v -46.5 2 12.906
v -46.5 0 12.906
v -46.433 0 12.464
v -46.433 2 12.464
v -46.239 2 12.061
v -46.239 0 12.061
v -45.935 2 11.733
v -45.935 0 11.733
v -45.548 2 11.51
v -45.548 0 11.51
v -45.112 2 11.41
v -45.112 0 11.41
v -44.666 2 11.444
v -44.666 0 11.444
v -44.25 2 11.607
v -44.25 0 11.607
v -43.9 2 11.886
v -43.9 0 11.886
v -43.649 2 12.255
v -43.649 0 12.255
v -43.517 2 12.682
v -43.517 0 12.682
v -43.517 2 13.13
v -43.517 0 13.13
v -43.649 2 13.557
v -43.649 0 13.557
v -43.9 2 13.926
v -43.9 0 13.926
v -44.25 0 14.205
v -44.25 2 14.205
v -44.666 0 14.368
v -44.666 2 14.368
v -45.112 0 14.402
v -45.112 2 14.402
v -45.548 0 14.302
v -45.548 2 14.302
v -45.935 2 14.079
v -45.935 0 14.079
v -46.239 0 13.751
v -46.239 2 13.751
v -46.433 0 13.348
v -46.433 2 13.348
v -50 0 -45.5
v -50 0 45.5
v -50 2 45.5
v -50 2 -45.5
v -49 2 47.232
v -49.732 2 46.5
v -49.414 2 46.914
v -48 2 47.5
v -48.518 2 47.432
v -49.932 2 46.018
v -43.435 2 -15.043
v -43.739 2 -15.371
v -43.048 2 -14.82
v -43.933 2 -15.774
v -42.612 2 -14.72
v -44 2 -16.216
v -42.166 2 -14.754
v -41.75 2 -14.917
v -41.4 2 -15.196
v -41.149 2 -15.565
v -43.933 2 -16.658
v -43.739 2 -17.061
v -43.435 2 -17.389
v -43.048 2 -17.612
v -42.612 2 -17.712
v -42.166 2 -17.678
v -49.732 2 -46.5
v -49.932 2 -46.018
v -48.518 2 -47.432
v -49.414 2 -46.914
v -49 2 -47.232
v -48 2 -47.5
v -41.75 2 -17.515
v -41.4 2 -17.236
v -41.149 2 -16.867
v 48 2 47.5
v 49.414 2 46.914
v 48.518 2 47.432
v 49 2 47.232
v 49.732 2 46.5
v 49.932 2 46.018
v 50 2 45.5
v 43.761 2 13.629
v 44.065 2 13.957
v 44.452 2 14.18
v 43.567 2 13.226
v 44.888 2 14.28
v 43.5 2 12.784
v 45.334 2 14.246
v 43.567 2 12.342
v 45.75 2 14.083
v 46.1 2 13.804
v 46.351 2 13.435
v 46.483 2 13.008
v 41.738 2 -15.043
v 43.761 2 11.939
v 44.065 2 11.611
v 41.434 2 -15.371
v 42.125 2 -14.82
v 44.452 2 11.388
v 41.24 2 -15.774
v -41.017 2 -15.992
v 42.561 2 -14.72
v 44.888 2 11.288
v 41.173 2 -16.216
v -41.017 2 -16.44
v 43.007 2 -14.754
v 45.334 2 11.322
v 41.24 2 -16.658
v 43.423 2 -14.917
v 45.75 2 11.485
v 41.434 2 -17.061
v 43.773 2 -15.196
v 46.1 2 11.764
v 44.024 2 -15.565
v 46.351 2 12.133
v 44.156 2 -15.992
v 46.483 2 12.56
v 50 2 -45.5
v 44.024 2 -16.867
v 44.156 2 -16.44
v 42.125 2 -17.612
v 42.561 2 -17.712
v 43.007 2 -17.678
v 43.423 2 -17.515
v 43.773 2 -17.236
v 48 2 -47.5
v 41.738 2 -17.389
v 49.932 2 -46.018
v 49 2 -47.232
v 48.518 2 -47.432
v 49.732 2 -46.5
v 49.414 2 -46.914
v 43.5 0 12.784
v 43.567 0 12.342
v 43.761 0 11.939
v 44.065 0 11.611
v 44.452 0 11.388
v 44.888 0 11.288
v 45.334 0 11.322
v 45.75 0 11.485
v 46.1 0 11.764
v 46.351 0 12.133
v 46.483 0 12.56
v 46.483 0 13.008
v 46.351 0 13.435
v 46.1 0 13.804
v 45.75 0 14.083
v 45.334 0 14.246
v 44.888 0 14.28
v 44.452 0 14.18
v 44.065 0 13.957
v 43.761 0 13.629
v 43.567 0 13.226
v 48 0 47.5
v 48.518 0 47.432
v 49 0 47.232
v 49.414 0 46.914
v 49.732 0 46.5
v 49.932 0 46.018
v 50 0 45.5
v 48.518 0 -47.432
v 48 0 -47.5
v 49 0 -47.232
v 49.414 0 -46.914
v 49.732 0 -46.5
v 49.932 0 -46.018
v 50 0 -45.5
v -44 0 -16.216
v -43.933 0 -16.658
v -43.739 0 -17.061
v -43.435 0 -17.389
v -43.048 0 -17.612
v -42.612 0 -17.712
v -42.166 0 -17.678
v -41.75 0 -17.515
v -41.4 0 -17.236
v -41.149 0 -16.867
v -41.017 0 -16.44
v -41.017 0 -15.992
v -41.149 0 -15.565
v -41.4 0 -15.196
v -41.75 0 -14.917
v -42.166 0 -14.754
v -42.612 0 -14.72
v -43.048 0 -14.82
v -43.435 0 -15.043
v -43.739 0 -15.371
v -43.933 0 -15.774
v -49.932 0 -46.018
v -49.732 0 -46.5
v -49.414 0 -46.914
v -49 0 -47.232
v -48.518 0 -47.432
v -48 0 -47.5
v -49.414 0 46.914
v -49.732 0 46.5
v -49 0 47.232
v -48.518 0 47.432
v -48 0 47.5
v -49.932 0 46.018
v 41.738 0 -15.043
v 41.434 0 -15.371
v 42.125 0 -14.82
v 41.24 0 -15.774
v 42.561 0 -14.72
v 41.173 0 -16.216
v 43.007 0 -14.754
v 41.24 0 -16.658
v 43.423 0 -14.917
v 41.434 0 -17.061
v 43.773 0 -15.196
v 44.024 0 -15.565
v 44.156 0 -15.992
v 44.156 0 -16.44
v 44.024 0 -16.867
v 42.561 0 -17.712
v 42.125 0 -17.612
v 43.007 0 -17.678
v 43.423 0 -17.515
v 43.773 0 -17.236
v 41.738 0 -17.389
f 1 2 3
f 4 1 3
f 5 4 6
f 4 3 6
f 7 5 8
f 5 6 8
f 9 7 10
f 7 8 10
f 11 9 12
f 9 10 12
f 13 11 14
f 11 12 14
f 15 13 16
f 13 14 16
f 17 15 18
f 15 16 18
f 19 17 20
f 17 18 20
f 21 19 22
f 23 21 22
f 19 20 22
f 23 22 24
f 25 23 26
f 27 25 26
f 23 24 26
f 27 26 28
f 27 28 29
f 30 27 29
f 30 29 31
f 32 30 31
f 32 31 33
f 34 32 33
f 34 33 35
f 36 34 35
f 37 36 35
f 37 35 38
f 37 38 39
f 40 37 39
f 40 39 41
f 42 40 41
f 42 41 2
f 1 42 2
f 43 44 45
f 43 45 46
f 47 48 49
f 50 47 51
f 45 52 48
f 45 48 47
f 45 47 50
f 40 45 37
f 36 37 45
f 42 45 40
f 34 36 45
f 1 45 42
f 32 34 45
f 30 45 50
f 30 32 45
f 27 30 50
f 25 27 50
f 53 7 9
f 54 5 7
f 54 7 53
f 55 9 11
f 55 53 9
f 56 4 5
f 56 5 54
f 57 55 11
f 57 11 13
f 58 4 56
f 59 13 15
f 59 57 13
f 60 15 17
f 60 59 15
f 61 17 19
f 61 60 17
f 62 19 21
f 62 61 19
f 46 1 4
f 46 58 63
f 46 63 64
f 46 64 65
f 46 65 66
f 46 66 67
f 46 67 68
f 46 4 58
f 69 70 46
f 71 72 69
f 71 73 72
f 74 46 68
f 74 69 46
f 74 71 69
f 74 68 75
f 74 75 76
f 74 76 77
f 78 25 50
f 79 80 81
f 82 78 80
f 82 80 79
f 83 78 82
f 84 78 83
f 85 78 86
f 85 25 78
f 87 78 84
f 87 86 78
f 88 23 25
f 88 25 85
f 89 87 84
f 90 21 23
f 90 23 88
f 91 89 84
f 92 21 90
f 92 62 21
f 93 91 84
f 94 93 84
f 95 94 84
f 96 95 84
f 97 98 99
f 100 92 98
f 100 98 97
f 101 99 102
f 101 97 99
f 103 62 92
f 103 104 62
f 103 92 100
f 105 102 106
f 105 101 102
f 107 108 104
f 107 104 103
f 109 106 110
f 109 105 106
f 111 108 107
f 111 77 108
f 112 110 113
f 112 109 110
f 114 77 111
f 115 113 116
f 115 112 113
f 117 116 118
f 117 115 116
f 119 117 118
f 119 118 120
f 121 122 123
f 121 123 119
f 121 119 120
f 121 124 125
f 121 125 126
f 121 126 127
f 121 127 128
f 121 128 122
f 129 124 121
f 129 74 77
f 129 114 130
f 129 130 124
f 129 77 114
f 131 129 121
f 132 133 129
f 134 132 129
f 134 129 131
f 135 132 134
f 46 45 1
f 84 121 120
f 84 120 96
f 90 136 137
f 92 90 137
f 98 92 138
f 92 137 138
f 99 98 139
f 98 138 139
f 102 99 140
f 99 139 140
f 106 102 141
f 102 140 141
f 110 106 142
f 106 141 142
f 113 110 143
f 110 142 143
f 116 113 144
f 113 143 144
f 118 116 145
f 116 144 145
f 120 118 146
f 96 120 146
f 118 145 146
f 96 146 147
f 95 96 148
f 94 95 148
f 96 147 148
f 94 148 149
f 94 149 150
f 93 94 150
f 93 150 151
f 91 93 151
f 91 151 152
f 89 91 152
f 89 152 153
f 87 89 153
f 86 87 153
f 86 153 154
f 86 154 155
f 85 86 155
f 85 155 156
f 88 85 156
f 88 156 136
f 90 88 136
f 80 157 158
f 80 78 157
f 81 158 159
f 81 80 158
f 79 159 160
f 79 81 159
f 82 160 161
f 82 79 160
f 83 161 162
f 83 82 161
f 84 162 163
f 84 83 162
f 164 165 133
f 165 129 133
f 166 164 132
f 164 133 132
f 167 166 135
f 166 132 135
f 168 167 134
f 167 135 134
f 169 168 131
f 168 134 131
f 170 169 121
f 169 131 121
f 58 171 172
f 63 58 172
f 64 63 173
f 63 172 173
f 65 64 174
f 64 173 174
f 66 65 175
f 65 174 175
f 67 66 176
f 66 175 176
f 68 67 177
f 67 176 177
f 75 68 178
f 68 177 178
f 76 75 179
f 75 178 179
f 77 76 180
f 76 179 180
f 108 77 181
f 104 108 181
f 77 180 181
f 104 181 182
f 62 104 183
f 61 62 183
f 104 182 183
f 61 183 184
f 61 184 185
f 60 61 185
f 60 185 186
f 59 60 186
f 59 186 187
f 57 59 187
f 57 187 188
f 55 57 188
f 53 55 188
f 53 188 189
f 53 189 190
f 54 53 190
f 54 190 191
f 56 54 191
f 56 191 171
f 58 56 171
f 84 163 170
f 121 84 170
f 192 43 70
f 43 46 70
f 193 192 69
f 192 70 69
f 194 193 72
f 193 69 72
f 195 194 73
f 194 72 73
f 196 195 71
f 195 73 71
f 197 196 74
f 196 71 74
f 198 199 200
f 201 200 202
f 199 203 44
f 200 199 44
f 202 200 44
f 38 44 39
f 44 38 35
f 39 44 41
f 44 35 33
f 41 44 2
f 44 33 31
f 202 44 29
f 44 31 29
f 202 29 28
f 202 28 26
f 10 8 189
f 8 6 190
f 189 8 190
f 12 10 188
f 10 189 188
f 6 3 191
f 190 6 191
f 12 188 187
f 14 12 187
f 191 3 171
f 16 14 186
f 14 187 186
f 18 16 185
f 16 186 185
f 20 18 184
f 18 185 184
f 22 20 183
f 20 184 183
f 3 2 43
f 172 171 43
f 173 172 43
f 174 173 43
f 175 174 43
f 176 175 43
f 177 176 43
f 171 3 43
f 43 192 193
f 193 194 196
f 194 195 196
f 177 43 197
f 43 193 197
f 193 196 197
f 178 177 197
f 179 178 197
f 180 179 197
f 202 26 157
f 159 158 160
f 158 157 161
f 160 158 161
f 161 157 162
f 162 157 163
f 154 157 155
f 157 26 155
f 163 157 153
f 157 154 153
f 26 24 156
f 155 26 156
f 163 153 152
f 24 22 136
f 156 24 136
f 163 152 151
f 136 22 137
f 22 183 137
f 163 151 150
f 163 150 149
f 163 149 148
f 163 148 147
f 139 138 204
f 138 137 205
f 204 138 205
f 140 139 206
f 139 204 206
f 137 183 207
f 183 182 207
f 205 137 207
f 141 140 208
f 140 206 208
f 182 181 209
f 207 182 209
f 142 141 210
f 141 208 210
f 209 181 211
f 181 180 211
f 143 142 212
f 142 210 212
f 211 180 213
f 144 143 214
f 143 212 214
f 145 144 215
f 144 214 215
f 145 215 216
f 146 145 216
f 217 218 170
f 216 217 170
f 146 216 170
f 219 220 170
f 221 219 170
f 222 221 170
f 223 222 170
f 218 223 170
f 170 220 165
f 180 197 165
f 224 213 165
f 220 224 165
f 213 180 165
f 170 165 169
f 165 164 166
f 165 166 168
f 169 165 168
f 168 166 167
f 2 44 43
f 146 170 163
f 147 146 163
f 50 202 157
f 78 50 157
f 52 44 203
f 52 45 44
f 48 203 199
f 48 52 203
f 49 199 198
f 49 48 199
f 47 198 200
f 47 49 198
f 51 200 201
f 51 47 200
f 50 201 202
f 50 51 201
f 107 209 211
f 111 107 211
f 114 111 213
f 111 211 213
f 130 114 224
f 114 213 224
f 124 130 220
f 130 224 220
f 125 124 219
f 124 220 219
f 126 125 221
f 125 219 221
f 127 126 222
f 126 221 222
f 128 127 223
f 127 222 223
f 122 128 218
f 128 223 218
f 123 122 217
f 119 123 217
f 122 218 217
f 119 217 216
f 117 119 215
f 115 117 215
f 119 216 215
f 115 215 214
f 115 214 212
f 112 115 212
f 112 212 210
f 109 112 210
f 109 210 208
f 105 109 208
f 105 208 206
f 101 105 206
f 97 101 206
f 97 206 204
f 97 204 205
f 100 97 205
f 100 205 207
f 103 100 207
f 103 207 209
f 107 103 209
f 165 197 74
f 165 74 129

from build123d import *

# Parameters (mm, degrees)
SKETCH_1_W      = 100
SKETCH_1_H      = 95
EXTRUDE_1_DEPTH = 2
HOLE_WIZARD_1_D = 3
FILLET_1_R      = 2


with BuildPart() as part:
    # 草图1 → 凸台-拉伸1 (new body)
    with BuildSketch(Plane(origin=(0, 0, 0), x_dir=(1, 0, 0), z_dir=(0, 1, 0))):
        Rectangle(SKETCH_1_W, SKETCH_1_H)
    extrude(amount=EXTRUDE_1_DEPTH)

    # 孔1 (through all)
    with Locations(Plane(origin=(0, 2, 0), x_dir=(1, 0, 0), z_dir=(0, 1, 0))):
        with Locations((-45, -12.906), (-42.5, 16.216), (42.673, 16.216), (45, -12.784)):
            Hole(HOLE_WIZARD_1_D / 2)

    # 圆角1
    fillet_1_edges = [part.edges().sort_by_distance(p)[0] for p in [
        (50, 1, 47.5),
        (-50, 1, 47.5),
        (-50, 1, -47.5),
        (50, 1, -47.5),
    ]]
    fillet(fillet_1_edges, radius=FILLET_1_R)


solid = part.part
